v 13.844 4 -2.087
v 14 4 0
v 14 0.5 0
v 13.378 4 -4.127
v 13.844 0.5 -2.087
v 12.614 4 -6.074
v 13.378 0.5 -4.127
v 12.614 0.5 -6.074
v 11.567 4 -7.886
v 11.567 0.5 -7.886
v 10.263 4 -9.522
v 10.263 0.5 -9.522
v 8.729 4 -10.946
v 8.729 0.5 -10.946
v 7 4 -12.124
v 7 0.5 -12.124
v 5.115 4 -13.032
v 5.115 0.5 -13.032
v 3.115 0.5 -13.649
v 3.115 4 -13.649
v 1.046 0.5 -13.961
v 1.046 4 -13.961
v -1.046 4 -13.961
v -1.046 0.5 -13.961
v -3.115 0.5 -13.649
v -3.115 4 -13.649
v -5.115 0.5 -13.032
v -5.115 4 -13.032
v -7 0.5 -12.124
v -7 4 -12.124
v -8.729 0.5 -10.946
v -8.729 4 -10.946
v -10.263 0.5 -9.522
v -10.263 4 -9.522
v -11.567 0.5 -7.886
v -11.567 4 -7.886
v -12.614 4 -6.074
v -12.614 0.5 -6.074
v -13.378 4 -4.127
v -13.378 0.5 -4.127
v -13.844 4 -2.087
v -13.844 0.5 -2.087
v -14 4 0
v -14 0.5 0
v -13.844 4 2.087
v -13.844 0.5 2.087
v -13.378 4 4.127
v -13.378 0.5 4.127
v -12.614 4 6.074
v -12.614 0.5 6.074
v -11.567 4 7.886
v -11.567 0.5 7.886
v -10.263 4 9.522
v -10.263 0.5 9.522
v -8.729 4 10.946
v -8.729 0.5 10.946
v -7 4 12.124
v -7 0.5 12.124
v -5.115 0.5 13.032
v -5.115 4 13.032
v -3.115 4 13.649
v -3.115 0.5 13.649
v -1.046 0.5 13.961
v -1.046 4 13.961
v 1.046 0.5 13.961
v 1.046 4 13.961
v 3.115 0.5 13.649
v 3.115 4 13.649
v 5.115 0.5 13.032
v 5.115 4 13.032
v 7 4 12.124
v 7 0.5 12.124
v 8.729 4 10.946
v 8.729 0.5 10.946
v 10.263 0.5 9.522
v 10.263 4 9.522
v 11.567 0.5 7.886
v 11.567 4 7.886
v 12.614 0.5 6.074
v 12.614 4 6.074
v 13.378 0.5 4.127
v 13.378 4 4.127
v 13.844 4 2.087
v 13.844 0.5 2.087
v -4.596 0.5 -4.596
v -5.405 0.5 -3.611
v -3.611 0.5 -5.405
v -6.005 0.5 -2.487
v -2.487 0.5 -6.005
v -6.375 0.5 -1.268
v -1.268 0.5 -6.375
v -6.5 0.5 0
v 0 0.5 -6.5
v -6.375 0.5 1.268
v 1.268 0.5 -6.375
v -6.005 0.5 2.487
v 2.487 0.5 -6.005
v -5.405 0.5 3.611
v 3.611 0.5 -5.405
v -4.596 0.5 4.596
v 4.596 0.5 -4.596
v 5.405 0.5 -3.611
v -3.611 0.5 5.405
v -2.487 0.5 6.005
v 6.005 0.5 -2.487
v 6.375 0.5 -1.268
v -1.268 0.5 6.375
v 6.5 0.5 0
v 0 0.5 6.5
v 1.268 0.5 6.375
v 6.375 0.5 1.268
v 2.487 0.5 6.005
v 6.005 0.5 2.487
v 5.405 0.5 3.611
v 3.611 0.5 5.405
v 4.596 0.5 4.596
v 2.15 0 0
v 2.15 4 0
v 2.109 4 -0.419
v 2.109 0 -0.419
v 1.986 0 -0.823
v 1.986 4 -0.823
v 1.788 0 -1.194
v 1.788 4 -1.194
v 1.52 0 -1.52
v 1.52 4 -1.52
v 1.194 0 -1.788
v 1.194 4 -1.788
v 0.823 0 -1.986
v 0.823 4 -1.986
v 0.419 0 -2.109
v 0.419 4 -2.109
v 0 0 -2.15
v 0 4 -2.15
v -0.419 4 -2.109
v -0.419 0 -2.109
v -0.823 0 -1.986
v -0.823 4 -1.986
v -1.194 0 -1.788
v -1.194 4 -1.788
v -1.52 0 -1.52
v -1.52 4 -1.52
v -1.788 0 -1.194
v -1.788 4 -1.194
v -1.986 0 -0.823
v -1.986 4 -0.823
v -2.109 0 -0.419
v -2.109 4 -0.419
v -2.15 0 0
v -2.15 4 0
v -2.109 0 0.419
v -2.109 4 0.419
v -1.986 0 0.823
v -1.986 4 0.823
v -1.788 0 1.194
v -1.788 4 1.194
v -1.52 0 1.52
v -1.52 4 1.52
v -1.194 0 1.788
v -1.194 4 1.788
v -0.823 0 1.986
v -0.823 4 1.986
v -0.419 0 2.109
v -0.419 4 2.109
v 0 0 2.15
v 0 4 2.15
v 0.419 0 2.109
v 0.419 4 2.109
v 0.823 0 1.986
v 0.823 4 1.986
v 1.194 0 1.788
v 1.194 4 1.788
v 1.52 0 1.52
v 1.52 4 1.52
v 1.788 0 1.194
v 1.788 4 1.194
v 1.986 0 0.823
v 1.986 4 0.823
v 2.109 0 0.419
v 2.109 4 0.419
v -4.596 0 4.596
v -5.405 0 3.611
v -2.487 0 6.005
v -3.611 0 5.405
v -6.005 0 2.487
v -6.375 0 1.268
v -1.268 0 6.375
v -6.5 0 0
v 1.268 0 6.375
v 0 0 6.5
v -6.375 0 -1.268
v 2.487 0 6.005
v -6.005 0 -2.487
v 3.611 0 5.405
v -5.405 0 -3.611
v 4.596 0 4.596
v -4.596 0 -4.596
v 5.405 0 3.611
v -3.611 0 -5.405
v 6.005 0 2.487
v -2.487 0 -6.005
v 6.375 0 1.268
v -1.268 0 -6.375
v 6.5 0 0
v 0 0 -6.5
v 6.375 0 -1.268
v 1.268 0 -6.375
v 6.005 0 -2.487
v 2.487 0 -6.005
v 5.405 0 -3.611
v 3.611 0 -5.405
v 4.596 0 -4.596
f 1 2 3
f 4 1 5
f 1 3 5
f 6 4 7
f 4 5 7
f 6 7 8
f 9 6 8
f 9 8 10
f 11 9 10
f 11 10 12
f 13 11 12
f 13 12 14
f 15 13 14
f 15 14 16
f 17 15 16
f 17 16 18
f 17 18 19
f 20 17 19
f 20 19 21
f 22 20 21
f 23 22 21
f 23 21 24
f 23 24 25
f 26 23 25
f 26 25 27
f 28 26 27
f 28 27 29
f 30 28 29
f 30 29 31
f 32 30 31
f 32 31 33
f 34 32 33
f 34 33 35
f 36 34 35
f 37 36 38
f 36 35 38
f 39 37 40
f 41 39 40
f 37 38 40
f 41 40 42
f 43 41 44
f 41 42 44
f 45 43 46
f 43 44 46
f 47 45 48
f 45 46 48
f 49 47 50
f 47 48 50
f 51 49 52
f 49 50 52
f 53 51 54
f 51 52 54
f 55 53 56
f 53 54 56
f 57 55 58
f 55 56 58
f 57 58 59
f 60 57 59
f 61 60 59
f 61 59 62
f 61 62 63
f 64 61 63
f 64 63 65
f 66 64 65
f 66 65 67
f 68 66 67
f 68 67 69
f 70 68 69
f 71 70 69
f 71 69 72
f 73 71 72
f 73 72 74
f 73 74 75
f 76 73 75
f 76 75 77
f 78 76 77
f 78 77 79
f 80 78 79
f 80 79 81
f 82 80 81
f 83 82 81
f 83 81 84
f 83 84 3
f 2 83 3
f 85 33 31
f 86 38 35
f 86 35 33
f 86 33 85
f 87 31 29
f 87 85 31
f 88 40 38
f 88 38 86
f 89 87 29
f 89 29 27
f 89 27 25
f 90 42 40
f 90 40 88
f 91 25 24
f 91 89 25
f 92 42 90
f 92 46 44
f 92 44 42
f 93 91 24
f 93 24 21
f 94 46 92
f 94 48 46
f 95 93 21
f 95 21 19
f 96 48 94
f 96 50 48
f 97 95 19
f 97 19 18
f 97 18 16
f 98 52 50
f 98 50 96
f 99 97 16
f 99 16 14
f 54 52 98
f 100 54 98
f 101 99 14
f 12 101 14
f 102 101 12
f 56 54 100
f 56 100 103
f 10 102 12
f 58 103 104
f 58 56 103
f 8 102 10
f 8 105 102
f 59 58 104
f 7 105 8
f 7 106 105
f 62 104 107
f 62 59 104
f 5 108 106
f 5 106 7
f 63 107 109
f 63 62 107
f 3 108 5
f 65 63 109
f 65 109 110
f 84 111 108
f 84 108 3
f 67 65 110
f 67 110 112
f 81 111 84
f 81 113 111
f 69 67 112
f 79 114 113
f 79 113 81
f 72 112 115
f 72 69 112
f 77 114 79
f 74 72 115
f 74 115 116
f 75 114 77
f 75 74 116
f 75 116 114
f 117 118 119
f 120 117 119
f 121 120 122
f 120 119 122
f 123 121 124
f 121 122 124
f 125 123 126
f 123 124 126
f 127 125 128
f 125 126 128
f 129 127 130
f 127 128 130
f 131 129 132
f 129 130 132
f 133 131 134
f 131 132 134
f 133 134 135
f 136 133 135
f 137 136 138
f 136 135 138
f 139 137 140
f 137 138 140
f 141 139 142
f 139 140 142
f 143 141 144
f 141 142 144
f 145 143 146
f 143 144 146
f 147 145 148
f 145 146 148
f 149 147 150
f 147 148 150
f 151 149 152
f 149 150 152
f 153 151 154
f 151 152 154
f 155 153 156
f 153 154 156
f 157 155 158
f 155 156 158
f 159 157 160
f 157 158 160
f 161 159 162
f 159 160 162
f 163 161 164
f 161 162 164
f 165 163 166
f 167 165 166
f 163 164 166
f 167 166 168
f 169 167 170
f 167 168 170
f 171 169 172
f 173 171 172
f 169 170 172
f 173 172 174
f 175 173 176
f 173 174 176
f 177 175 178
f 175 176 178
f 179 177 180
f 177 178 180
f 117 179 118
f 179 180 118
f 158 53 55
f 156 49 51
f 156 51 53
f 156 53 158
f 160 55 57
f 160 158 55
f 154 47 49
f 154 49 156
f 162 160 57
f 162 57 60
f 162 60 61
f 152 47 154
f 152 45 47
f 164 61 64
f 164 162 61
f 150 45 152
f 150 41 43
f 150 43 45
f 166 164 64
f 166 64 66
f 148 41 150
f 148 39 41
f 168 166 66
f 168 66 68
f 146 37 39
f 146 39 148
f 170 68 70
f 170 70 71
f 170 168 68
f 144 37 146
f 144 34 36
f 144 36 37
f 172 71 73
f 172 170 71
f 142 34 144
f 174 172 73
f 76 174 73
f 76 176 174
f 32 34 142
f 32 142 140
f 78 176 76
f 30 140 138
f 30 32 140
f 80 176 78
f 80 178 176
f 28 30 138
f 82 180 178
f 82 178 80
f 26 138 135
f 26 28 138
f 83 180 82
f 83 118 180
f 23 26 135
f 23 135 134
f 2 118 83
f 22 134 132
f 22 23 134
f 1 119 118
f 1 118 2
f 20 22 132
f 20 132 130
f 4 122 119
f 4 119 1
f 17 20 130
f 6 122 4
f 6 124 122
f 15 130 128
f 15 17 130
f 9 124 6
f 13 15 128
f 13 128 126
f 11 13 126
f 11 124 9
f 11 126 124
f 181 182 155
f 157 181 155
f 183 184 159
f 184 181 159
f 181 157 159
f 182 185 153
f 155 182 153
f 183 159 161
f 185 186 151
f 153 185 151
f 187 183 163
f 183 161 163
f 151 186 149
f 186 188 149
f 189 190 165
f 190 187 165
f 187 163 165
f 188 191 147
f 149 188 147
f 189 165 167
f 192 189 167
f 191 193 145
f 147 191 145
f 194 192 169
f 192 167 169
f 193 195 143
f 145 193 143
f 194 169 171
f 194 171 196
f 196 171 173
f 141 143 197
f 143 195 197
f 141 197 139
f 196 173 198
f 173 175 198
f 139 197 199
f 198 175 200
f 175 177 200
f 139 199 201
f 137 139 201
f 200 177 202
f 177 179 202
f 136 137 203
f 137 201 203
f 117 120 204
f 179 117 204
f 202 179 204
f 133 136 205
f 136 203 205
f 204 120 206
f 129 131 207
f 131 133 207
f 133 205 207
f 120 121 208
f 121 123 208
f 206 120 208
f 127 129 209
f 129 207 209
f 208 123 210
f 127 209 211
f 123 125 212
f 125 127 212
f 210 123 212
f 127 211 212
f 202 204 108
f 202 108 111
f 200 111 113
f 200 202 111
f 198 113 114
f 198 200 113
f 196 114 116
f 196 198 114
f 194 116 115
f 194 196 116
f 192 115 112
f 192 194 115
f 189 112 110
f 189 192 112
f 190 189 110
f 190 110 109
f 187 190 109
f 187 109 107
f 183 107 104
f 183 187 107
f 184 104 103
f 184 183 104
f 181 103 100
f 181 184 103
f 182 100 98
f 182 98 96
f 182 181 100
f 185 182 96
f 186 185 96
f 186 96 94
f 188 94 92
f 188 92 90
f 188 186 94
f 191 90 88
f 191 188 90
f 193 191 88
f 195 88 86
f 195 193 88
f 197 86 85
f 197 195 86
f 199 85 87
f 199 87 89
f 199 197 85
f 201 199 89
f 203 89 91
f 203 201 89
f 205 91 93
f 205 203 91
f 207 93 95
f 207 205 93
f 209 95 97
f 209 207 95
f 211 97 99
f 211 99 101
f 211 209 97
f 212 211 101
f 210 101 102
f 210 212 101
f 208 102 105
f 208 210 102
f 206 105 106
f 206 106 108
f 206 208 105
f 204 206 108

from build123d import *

# Parameters (mm, degrees)
SKETCH1_R           = 14
BOSS_EXTRUDE1_DEPTH = 4
SKETCH2_R           = 14
SKETCH2_R_2         = 6.5
CUT_EXTRUDE1_DEPTH  = 0.5
SKETCH3_R           = 2.15
CUT_EXTRUDE2_DEPTH  = 4


with BuildPart() as part:
    # Sketch1 → Boss-Extrude1 (new body)
    with BuildSketch(Plane(origin=(0, 0, 0), x_dir=(1, 0, 0), z_dir=(0, 1, 0))):
        Circle(SKETCH1_R)
    extrude(amount=BOSS_EXTRUDE1_DEPTH)

    # Sketch2 → Cut-Extrude1 (cut)
    with BuildSketch(Plane.XZ):
        Circle(SKETCH2_R)
        Circle(SKETCH2_R_2, mode=Mode.SUBTRACT)
    extrude(amount=-CUT_EXTRUDE1_DEPTH, mode=Mode.SUBTRACT)

    # Sketch3 → Cut-Extrude2 (cut)
    with BuildSketch(Plane(origin=(0, 4, 0), x_dir=(1, 0, 0), z_dir=(0, 1, 0))):
        Circle(SKETCH3_R)
    extrude(amount=-CUT_EXTRUDE2_DEPTH, mode=Mode.SUBTRACT)


solid = part.part
